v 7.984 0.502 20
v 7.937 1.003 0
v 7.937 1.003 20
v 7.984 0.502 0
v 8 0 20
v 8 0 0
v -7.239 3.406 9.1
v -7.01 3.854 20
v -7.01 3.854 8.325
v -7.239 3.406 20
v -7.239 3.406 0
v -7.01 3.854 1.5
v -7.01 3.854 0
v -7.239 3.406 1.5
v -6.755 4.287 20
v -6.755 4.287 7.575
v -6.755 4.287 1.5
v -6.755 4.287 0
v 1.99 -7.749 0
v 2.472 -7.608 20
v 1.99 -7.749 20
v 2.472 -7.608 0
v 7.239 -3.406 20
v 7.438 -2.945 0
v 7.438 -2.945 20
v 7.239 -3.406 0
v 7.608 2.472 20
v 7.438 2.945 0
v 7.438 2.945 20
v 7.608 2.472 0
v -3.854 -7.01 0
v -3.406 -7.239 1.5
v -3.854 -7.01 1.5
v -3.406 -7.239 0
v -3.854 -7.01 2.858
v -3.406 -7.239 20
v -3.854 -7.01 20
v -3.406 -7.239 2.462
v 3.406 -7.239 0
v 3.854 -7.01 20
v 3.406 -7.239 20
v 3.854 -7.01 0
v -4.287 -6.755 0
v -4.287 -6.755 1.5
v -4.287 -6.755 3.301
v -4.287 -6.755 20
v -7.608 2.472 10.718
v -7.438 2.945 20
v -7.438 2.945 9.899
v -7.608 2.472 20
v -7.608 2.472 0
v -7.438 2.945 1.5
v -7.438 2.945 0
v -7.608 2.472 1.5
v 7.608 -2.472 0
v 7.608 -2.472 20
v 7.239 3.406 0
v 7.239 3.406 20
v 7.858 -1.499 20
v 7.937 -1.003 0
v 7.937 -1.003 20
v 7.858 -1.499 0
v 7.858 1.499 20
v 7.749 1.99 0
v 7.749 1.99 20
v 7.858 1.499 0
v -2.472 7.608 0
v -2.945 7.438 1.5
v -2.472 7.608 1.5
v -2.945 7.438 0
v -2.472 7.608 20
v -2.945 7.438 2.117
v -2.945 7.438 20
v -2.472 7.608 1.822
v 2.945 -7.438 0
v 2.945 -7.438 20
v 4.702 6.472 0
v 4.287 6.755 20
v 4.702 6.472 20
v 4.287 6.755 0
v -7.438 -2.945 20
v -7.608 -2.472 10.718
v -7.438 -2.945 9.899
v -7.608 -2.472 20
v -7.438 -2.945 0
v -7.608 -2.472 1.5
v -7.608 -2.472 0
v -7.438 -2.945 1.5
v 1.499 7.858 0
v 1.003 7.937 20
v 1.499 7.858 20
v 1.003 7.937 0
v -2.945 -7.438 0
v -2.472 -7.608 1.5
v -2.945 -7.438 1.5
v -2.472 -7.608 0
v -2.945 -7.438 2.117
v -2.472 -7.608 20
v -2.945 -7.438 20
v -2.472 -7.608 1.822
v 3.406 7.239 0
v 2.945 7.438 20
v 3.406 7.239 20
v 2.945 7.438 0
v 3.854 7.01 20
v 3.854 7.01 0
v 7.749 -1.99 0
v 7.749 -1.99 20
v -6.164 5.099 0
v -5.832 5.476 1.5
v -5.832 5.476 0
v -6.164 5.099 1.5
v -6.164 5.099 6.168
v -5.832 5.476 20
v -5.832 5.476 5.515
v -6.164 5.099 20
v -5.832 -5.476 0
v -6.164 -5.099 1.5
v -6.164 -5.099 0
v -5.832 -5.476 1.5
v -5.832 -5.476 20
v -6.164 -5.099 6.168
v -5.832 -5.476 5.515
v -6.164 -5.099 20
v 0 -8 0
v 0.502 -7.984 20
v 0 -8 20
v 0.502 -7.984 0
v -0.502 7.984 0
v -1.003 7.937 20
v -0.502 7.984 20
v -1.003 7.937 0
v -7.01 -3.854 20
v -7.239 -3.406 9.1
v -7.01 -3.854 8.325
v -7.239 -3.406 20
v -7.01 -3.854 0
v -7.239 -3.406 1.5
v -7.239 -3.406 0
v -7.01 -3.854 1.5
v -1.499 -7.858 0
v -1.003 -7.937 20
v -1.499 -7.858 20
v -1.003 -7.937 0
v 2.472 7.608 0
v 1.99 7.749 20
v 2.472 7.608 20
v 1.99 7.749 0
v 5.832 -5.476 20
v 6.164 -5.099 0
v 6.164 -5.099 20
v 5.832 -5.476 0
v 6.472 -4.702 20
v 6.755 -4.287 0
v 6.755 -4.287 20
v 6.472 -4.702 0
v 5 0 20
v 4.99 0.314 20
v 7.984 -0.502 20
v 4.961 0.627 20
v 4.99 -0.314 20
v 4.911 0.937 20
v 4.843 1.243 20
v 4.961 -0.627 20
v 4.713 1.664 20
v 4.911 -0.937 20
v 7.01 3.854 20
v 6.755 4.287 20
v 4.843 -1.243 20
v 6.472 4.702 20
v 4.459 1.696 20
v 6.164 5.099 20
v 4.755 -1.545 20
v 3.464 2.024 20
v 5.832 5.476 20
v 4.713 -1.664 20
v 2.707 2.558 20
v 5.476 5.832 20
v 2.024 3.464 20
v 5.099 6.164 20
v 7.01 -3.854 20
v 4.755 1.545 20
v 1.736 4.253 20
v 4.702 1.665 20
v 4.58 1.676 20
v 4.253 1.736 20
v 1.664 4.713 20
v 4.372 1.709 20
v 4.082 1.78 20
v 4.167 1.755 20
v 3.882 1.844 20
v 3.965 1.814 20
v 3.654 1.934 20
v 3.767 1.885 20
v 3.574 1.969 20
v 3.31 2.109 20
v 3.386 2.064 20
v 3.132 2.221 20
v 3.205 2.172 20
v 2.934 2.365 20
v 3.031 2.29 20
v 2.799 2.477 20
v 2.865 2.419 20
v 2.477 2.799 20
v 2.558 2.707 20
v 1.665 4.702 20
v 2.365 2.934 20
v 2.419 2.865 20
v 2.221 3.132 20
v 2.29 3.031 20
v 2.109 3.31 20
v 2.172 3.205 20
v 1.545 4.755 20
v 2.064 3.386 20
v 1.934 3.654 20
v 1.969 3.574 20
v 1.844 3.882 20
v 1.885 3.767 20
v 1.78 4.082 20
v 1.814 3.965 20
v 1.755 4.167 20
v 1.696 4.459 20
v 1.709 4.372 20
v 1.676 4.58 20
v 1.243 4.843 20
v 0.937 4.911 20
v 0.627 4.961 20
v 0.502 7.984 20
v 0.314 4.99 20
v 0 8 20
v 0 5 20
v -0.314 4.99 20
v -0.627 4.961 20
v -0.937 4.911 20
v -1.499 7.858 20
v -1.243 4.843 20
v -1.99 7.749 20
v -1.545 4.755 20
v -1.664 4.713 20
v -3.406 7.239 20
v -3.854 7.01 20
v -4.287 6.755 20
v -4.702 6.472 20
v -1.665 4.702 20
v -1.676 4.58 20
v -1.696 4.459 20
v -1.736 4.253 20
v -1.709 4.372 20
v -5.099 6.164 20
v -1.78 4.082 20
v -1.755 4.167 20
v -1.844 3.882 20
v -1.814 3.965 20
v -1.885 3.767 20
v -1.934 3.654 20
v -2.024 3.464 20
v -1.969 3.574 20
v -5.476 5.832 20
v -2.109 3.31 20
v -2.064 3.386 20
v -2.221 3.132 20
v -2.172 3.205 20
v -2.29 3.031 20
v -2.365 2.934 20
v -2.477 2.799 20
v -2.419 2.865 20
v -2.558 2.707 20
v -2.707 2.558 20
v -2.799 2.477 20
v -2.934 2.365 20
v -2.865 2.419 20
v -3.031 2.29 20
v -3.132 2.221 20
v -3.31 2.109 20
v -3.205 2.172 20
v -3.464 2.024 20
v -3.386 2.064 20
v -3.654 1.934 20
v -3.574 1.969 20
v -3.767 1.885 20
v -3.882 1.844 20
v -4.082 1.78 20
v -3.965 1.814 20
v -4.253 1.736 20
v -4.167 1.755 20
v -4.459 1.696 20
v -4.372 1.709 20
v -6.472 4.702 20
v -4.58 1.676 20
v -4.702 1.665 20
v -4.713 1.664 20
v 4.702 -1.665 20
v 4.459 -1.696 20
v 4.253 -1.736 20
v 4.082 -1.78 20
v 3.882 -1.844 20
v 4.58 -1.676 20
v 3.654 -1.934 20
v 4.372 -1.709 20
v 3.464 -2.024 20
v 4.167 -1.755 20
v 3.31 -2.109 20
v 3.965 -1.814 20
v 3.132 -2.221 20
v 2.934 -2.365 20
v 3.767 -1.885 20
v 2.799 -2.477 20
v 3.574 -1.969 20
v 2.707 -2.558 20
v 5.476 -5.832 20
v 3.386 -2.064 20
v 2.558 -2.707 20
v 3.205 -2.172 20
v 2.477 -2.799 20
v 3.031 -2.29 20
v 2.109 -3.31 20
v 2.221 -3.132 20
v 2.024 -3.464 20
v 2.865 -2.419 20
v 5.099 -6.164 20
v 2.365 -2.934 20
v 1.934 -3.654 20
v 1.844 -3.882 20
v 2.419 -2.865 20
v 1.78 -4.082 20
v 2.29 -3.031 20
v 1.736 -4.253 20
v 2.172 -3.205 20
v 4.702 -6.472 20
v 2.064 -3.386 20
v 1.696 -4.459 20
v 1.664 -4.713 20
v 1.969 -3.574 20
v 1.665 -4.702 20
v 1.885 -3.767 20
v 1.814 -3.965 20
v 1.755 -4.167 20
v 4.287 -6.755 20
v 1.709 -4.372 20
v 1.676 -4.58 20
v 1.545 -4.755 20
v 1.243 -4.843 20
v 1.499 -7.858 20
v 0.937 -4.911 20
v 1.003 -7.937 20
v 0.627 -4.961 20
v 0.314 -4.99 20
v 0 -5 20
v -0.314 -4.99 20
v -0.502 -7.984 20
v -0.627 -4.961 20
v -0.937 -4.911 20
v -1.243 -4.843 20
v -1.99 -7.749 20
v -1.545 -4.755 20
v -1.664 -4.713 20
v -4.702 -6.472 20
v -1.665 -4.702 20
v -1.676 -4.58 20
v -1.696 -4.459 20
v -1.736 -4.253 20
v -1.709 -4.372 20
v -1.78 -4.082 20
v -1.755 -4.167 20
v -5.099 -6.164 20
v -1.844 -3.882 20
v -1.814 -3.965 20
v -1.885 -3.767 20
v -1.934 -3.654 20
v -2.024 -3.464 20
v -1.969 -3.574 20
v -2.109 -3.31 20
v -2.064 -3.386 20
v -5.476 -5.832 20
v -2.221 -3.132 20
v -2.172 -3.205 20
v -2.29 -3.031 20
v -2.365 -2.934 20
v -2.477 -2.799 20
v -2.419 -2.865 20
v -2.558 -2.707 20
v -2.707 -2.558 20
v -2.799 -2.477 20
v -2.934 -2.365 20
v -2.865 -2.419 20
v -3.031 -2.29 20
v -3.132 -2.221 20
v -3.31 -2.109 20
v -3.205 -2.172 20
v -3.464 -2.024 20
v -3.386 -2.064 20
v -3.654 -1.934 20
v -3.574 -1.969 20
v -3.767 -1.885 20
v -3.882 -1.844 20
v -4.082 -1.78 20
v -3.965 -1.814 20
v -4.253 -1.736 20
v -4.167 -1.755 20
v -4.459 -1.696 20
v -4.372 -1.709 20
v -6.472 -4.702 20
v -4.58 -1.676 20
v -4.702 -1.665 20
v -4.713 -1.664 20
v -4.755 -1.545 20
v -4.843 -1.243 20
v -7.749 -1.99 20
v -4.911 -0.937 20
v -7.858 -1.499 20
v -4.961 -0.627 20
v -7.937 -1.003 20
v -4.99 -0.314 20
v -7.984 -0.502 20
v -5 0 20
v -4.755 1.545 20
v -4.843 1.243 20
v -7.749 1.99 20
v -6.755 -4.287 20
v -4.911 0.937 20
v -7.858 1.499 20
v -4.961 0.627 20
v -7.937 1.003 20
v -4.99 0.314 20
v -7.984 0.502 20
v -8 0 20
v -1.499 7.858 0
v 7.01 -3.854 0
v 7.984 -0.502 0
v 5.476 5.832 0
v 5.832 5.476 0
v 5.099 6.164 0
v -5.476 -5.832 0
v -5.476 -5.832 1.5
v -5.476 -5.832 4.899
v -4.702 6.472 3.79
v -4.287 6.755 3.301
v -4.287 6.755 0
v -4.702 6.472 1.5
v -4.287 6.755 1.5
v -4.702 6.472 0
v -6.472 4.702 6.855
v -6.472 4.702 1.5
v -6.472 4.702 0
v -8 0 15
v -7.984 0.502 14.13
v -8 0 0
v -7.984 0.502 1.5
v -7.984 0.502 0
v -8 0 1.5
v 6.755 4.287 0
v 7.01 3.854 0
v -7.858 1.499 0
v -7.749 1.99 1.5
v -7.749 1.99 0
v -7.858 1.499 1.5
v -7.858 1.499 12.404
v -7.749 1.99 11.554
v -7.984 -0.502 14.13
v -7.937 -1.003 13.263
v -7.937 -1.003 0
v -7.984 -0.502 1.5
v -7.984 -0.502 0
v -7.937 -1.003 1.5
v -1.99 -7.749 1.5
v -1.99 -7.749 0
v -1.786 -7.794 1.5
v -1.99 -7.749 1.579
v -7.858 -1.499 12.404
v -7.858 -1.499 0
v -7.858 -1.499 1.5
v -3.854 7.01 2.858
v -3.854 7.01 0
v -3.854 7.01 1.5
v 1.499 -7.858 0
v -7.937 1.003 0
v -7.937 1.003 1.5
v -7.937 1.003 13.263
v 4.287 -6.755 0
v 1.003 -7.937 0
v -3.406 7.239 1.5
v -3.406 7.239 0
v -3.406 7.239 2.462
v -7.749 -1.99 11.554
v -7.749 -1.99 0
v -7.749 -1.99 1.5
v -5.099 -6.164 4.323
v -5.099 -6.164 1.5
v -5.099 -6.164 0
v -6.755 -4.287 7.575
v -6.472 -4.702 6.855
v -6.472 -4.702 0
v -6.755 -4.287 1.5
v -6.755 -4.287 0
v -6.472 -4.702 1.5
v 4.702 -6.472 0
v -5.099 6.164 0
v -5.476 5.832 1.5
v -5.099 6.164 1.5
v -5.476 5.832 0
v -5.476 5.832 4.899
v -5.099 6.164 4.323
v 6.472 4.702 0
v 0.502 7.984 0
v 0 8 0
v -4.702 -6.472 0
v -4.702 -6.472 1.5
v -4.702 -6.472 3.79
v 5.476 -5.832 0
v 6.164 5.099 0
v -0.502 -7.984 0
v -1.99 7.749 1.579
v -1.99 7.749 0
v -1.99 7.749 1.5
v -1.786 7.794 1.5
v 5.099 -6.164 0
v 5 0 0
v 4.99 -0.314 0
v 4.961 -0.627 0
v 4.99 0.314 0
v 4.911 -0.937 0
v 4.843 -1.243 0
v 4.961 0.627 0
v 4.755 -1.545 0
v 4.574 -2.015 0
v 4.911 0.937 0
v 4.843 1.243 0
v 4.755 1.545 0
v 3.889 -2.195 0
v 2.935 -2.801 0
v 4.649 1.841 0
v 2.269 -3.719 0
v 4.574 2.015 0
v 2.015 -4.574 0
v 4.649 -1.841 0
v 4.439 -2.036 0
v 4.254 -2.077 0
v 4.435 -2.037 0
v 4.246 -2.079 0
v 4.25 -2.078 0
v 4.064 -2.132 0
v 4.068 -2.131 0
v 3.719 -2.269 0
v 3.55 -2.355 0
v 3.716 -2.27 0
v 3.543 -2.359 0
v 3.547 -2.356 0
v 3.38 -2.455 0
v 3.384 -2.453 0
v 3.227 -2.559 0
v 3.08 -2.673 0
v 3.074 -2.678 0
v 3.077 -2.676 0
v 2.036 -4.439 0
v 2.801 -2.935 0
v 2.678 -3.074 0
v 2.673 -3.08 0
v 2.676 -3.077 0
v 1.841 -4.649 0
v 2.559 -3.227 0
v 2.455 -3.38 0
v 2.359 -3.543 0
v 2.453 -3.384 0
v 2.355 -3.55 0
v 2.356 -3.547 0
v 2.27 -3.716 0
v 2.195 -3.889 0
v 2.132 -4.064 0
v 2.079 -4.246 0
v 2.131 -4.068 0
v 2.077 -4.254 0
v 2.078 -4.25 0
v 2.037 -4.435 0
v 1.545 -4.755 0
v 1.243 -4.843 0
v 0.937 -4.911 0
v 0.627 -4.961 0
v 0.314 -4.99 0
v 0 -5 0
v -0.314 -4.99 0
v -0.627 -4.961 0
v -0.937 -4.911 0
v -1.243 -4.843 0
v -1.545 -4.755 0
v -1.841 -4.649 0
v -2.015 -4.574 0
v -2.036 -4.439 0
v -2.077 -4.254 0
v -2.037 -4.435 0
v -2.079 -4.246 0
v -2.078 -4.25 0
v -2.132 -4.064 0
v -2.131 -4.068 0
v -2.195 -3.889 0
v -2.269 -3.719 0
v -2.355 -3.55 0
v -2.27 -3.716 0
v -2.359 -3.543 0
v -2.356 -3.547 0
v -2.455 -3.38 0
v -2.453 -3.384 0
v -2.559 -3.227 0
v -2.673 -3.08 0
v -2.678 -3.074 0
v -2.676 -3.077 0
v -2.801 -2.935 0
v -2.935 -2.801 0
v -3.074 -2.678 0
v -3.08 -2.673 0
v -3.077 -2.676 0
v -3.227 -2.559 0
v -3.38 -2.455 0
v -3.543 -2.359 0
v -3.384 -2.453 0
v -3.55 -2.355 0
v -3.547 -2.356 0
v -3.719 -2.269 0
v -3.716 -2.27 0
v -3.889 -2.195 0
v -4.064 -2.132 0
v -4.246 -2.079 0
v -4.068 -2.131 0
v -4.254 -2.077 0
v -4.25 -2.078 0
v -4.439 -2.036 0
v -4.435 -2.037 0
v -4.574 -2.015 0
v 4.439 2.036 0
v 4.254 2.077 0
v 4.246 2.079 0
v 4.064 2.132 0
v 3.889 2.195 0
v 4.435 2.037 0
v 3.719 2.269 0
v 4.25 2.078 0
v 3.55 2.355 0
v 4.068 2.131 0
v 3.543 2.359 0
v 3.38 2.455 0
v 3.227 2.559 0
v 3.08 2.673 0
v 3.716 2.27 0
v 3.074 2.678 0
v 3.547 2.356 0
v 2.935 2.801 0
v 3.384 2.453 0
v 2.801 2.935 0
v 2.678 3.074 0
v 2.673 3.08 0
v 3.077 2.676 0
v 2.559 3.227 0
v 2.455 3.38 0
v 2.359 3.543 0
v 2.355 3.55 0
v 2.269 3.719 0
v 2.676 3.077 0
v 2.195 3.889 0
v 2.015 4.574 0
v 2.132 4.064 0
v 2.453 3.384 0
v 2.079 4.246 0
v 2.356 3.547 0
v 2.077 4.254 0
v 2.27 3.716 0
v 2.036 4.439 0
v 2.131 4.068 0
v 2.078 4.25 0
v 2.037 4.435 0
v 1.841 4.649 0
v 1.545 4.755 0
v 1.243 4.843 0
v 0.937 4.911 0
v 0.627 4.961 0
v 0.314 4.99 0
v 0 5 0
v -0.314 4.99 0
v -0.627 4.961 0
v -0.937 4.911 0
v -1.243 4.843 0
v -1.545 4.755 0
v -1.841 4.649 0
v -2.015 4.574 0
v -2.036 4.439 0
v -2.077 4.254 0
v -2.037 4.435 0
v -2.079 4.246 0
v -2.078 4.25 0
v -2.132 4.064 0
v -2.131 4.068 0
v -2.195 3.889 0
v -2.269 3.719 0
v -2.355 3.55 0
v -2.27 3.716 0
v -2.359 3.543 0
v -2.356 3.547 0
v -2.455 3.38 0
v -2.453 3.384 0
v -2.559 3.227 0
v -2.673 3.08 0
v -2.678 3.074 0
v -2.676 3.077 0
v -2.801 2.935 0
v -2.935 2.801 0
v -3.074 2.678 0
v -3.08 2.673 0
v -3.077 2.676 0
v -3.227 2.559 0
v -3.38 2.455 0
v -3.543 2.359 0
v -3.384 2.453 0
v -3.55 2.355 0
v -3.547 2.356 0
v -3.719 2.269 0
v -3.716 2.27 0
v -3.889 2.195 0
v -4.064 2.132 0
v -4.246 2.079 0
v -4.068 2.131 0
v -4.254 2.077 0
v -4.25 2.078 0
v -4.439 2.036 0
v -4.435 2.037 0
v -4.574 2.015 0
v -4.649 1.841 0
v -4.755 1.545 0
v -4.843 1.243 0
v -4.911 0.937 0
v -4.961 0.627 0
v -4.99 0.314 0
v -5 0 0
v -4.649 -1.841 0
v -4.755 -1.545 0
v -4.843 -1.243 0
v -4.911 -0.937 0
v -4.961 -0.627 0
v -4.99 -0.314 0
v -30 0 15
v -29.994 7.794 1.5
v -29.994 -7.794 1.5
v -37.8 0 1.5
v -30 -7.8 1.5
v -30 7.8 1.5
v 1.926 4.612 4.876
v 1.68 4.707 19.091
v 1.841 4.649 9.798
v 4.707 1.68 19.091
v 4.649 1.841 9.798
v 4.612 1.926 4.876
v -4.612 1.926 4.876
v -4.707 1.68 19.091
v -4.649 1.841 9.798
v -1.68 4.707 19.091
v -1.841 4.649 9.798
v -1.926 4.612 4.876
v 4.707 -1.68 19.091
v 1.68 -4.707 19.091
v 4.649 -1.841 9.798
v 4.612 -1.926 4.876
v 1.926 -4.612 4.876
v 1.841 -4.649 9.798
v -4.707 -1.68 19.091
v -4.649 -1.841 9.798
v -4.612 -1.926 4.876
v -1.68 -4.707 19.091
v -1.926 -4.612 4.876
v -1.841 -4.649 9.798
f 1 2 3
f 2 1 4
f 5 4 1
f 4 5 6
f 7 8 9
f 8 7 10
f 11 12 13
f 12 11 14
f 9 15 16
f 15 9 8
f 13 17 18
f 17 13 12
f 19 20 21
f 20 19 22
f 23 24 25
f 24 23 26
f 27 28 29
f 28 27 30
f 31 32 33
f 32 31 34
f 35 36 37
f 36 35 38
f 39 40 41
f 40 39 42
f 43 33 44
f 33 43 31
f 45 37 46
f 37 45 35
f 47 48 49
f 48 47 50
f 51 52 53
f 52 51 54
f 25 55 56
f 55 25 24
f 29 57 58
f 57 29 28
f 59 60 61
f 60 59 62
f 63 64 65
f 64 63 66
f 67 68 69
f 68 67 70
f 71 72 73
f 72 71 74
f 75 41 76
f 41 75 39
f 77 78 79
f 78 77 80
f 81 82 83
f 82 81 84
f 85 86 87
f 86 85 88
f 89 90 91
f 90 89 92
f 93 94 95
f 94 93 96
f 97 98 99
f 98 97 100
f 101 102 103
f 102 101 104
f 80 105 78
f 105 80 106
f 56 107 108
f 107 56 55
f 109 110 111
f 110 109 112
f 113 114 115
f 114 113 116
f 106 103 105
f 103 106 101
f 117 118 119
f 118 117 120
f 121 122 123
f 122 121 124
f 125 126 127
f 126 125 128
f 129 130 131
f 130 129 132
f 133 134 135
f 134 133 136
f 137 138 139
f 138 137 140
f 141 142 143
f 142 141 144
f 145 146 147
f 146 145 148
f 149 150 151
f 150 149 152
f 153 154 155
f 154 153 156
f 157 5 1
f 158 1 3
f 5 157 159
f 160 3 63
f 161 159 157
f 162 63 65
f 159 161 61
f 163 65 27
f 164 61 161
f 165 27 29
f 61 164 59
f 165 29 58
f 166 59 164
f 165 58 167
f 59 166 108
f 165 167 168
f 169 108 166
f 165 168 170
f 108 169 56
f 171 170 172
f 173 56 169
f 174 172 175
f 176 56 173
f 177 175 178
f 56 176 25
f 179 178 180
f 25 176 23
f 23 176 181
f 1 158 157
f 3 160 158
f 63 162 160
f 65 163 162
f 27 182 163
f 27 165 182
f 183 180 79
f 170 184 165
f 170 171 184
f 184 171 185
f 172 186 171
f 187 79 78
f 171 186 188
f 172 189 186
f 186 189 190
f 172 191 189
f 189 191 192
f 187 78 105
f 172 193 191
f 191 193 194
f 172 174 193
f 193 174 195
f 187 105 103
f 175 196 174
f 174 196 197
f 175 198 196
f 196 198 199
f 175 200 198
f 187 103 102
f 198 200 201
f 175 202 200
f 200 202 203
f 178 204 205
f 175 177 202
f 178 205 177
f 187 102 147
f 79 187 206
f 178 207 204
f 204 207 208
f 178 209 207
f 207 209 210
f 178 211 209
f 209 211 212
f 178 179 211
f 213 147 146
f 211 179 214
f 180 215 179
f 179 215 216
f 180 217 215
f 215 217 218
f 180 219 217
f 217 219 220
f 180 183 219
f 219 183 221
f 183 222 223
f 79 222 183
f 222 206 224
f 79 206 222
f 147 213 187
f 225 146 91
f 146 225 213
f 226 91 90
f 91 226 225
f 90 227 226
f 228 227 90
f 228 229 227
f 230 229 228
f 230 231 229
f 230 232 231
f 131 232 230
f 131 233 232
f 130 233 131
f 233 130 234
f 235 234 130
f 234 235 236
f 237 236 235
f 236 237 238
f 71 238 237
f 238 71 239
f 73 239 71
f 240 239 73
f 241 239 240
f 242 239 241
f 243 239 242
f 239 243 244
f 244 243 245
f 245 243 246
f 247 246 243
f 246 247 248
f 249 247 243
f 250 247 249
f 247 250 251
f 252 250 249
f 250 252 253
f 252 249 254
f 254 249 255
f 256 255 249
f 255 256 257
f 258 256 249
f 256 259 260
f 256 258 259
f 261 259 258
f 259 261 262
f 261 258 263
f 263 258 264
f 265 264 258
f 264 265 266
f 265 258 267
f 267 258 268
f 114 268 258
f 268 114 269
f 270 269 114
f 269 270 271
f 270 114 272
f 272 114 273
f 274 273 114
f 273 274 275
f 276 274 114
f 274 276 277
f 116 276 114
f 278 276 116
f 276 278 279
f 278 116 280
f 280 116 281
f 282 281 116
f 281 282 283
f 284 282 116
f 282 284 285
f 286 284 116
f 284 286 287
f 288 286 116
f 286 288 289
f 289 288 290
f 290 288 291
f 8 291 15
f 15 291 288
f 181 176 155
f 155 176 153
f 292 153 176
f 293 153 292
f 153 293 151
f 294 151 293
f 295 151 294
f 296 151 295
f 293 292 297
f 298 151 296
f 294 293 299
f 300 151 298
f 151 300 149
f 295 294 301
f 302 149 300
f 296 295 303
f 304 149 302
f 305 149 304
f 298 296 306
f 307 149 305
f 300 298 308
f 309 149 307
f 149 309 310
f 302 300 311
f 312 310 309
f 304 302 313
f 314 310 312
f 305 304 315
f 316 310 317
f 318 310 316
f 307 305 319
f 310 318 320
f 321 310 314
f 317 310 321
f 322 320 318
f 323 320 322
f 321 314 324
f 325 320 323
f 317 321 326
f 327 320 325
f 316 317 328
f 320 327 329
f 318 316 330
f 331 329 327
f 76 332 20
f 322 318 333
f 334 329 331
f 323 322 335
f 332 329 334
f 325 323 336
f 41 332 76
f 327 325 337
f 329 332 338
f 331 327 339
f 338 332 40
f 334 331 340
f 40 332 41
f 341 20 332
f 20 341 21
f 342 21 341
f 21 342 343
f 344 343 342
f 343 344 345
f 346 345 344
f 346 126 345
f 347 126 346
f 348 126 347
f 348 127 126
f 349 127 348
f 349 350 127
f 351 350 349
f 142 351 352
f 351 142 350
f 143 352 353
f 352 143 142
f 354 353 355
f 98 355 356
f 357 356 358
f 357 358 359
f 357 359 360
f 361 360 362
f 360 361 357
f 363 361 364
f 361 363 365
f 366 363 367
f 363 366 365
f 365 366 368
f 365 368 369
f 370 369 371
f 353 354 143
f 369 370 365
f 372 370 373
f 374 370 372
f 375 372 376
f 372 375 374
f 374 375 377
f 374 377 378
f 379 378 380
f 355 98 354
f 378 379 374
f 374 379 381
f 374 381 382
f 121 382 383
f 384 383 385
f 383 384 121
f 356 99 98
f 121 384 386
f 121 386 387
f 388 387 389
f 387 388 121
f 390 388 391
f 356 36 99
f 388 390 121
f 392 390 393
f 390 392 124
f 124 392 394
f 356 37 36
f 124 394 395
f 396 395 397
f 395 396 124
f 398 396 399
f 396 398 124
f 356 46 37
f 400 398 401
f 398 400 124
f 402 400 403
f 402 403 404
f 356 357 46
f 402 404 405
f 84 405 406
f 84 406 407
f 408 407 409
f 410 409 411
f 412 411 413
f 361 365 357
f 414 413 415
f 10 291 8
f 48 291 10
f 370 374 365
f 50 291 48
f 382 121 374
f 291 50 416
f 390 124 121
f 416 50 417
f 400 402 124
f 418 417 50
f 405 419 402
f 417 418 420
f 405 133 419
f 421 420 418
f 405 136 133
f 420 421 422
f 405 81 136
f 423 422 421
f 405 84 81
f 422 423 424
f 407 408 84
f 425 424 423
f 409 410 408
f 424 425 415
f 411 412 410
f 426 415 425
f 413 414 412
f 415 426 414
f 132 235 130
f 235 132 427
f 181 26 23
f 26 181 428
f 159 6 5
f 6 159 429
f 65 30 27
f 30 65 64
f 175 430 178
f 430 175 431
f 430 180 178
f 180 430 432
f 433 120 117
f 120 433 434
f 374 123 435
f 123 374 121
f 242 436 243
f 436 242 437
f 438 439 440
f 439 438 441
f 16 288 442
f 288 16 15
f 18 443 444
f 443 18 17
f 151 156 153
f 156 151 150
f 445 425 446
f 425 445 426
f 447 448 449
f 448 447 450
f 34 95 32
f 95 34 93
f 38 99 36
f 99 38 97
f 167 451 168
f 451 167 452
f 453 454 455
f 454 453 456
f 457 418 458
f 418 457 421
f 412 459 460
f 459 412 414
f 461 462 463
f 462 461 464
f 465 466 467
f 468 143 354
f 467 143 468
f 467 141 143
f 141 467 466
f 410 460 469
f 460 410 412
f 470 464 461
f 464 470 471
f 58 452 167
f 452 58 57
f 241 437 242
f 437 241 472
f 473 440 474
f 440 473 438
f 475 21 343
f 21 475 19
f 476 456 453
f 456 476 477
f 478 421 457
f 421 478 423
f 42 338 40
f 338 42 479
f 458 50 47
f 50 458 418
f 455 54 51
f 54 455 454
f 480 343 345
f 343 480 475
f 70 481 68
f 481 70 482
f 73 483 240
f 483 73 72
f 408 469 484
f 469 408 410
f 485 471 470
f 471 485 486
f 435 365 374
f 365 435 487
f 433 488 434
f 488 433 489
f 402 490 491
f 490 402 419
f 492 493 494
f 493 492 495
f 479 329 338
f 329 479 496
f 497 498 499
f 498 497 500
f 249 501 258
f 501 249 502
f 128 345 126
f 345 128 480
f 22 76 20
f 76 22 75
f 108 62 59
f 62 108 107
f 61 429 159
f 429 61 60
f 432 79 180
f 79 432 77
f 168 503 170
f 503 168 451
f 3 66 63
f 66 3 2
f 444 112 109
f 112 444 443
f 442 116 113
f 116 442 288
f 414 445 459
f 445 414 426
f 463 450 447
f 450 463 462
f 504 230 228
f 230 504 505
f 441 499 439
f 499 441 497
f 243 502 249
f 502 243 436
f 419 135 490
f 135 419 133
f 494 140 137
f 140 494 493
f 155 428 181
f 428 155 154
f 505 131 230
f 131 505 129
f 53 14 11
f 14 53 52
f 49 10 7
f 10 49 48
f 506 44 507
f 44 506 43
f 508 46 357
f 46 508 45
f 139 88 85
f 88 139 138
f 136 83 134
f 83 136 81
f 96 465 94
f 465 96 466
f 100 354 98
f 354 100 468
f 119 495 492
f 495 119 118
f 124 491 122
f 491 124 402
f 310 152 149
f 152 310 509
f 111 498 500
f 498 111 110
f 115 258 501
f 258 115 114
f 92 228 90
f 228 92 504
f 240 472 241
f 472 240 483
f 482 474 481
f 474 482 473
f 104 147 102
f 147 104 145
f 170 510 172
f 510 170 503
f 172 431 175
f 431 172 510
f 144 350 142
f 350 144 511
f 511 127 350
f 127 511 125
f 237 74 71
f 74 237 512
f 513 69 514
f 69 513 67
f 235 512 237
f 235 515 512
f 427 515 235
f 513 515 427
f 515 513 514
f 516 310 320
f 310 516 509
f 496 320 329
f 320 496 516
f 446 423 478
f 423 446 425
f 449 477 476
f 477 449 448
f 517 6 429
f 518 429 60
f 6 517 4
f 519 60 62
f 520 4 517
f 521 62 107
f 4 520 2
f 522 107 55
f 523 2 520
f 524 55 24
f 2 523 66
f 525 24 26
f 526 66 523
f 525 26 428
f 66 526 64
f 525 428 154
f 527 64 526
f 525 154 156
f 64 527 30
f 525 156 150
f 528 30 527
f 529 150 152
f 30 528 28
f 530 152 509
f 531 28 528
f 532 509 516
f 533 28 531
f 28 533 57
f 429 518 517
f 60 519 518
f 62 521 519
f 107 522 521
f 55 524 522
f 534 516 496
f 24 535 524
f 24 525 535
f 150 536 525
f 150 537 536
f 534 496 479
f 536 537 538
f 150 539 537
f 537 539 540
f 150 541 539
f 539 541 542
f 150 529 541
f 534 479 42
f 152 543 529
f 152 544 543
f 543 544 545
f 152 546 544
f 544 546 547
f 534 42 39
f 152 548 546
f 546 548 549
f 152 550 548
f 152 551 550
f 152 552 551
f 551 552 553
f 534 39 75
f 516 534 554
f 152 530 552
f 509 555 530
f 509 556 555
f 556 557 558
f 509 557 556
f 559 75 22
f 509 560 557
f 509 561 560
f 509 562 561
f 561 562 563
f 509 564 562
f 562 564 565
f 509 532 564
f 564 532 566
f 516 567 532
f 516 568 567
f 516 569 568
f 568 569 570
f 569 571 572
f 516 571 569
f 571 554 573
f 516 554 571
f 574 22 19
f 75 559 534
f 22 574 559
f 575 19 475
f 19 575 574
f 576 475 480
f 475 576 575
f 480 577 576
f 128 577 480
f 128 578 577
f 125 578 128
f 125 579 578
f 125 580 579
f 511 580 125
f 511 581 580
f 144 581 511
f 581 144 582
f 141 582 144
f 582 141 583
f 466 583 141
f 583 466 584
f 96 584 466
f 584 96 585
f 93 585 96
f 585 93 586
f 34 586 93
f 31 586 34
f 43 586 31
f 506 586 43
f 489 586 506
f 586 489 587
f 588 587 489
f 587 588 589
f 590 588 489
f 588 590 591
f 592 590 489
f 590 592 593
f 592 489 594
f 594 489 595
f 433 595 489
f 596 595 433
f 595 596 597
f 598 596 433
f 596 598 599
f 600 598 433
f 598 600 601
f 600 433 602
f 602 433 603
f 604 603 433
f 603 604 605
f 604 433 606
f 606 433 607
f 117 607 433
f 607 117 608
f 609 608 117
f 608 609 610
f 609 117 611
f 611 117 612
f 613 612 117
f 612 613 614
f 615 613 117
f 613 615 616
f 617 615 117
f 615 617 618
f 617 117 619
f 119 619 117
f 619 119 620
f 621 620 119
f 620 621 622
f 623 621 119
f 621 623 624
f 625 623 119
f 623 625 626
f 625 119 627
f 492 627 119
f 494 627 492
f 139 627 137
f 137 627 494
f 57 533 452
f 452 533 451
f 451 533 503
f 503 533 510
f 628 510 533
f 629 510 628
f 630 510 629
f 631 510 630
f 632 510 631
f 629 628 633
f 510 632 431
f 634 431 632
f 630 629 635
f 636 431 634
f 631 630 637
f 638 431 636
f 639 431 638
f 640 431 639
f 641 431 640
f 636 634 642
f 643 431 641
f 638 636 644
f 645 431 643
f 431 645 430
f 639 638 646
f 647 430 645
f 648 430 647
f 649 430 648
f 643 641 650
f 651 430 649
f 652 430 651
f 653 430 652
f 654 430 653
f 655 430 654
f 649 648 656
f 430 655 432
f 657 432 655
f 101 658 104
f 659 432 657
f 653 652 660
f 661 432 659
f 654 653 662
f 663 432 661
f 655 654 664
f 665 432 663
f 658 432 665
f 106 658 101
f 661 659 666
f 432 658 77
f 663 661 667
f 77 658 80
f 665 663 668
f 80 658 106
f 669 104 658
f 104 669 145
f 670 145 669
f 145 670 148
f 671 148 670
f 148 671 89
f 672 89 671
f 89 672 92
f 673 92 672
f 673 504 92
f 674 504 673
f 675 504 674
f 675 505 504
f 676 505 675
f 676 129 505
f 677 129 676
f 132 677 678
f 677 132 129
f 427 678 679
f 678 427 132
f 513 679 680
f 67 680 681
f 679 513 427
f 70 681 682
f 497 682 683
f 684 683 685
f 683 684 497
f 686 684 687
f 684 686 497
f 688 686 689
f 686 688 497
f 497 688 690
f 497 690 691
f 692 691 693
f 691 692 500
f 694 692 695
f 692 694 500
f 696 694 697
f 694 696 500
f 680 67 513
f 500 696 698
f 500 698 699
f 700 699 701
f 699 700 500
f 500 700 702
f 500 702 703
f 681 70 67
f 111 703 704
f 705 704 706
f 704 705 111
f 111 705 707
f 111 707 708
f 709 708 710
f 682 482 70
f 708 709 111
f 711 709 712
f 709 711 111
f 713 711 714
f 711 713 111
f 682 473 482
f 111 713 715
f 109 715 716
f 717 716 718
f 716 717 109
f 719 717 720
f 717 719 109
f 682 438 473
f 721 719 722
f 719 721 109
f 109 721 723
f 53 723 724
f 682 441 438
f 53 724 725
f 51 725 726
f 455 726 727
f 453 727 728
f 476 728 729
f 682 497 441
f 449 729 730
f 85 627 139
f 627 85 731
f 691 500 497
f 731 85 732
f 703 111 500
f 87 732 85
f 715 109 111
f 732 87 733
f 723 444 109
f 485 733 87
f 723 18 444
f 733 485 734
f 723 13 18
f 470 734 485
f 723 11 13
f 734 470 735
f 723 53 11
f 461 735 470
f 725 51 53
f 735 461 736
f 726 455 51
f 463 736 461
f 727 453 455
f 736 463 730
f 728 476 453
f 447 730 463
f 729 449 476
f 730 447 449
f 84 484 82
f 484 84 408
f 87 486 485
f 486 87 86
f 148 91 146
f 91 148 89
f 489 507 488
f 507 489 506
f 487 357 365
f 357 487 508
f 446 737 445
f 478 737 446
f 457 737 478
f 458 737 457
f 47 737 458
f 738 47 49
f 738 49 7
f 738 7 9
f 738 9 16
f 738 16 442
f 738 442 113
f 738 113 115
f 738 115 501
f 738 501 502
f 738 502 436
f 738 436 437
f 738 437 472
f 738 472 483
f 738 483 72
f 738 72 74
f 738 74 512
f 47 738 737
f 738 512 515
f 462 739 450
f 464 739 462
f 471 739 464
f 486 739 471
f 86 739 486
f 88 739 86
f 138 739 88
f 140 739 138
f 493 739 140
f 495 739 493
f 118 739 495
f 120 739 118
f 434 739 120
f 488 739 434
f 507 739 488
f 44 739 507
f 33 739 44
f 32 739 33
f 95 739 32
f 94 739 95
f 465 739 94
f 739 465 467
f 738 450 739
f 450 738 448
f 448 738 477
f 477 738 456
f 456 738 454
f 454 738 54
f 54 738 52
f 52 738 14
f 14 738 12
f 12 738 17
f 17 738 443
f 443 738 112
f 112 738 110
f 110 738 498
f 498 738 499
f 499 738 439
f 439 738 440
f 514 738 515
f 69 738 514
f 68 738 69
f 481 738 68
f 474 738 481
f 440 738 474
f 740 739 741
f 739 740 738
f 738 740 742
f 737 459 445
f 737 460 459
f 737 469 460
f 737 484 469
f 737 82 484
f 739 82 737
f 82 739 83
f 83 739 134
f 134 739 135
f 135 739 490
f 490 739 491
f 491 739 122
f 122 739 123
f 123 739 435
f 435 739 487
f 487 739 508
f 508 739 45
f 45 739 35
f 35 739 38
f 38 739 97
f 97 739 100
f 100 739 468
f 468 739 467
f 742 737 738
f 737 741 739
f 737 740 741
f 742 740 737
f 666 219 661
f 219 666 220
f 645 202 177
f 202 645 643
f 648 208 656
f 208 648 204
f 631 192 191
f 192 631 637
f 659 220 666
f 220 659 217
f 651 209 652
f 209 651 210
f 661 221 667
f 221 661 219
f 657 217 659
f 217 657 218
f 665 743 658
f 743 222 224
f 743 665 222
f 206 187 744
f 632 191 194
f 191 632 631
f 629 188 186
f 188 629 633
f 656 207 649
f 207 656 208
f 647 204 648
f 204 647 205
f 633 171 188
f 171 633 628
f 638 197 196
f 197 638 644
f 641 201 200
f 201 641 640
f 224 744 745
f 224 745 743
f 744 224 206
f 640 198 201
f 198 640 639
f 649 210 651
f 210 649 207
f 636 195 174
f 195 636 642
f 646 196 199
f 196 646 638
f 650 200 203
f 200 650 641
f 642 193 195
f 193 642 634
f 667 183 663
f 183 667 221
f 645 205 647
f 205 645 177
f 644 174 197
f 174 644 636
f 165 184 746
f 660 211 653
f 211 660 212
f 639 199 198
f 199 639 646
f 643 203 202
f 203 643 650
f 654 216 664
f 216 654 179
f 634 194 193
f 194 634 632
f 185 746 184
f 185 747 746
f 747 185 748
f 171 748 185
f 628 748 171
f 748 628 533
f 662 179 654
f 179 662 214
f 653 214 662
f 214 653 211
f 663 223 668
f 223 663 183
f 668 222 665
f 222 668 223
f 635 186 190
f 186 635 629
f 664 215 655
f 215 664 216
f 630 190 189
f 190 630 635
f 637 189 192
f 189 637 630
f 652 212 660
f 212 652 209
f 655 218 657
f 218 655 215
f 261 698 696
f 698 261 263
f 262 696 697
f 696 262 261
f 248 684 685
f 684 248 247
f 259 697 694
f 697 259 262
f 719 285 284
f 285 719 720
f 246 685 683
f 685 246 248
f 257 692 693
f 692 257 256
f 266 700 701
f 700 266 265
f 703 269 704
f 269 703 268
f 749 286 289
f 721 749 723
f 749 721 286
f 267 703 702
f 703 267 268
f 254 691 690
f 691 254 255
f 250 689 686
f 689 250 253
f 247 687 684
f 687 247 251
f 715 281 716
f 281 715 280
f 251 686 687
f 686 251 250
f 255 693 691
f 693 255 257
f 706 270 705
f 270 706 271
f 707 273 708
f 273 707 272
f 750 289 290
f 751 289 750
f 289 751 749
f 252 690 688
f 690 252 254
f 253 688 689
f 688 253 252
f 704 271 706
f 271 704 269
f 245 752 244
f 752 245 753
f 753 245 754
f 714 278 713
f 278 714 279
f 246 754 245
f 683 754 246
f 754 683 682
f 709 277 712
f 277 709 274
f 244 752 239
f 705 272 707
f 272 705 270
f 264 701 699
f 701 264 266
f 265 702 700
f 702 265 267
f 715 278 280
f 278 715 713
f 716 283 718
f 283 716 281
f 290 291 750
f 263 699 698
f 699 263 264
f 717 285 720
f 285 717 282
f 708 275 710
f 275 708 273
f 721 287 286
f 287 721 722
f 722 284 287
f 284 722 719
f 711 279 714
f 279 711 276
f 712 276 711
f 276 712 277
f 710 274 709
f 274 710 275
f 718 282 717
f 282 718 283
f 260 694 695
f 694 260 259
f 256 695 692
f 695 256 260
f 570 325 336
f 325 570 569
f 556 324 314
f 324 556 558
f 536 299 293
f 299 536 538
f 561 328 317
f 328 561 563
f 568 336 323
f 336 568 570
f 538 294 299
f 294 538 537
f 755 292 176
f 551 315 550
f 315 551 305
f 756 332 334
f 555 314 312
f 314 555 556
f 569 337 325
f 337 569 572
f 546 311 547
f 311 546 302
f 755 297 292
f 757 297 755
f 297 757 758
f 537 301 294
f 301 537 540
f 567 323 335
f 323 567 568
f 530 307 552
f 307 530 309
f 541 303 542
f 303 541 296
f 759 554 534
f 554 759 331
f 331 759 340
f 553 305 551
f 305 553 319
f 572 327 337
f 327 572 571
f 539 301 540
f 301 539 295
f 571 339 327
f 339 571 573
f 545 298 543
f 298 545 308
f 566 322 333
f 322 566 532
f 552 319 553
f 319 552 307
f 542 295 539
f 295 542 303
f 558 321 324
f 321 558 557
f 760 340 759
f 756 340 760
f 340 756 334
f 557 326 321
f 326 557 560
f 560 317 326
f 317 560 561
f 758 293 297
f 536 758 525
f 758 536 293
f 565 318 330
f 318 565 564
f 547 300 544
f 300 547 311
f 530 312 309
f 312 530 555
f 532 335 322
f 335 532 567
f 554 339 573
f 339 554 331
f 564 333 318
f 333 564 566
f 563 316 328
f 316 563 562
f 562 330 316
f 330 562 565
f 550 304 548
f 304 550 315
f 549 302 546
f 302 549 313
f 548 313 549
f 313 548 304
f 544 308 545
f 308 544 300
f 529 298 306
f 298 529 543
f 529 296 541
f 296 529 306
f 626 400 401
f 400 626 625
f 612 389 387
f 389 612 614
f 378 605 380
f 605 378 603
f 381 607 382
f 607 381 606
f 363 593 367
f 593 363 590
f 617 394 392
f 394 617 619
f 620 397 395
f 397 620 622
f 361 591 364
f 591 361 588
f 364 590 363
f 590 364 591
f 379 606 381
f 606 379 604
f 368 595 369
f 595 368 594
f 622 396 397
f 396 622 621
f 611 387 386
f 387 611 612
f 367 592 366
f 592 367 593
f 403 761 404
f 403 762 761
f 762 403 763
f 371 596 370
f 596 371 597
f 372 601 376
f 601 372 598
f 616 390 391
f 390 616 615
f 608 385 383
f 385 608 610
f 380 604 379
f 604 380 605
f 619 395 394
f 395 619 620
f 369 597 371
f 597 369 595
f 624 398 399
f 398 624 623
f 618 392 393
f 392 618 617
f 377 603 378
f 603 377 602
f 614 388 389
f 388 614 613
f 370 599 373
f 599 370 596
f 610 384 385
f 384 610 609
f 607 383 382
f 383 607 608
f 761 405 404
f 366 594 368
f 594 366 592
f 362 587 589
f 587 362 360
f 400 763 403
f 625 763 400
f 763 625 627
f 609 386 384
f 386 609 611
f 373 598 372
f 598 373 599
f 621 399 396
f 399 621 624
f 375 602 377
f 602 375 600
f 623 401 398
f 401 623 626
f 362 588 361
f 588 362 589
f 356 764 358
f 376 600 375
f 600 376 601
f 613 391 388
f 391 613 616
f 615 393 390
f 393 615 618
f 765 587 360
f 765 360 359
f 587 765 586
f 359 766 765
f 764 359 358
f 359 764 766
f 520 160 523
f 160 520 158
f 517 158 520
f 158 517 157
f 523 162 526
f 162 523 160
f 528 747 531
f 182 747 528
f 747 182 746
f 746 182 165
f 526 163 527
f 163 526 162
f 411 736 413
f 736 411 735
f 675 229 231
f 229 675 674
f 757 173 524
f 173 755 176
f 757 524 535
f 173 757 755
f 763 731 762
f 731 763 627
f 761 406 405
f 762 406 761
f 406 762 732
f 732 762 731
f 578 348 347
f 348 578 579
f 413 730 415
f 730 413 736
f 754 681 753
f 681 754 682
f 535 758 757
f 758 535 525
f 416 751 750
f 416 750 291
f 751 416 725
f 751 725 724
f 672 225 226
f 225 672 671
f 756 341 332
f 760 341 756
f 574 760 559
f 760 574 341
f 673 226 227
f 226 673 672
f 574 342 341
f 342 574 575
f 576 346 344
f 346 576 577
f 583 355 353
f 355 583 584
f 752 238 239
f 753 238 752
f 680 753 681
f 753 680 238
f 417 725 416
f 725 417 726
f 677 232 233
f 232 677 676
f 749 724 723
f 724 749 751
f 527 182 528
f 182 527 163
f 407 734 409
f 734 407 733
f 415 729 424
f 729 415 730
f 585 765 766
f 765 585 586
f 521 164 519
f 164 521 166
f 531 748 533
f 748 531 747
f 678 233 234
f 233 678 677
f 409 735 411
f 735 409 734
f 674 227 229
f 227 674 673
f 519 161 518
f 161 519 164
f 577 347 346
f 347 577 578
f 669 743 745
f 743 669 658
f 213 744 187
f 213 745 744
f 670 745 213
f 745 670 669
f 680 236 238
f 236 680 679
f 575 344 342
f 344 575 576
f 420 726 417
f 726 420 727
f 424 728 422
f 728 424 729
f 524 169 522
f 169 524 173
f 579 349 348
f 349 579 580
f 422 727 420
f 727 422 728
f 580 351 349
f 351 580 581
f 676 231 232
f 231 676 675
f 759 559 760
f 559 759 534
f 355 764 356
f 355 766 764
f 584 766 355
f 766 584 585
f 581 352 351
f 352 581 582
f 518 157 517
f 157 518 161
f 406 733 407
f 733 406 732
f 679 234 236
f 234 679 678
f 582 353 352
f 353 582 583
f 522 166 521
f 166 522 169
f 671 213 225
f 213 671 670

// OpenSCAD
$fn=100;
cylinder_height = 20;
cylinder_width = 8;



difference() {
    union() {
    cylinder(cylinder_height, cylinder_width, cylinder_width);
    translate([0,0,6]) {
        //trekant dims
        rotate(-90,[0,1,0]) {
            cylinder(30,9,9,$fn=3);
        }
    }
    //trekant spids
    translate([-30,0,1.5]) {
        cylinder(13.5,7.8,0, $fn=4); 
    }    
}    


    //hul i cylinder
    difference(){
        translate([0,0,-1]) {
            cylinder(30, 5, 5);
        }
        k = 5;
        for(i = [[k,k],[-k,k],[k,-k],[-k,-k]]){
            translate([i[0], i[1], -1])
                cylinder(60, 3, 4);
        }
    }
}



/*    
translate([-3,0,5]) {
    rotate(-90,[0,1,0]) {
        cylinder(50,10,10,$fn=3);
        }
}
*/
    
  
    
    
